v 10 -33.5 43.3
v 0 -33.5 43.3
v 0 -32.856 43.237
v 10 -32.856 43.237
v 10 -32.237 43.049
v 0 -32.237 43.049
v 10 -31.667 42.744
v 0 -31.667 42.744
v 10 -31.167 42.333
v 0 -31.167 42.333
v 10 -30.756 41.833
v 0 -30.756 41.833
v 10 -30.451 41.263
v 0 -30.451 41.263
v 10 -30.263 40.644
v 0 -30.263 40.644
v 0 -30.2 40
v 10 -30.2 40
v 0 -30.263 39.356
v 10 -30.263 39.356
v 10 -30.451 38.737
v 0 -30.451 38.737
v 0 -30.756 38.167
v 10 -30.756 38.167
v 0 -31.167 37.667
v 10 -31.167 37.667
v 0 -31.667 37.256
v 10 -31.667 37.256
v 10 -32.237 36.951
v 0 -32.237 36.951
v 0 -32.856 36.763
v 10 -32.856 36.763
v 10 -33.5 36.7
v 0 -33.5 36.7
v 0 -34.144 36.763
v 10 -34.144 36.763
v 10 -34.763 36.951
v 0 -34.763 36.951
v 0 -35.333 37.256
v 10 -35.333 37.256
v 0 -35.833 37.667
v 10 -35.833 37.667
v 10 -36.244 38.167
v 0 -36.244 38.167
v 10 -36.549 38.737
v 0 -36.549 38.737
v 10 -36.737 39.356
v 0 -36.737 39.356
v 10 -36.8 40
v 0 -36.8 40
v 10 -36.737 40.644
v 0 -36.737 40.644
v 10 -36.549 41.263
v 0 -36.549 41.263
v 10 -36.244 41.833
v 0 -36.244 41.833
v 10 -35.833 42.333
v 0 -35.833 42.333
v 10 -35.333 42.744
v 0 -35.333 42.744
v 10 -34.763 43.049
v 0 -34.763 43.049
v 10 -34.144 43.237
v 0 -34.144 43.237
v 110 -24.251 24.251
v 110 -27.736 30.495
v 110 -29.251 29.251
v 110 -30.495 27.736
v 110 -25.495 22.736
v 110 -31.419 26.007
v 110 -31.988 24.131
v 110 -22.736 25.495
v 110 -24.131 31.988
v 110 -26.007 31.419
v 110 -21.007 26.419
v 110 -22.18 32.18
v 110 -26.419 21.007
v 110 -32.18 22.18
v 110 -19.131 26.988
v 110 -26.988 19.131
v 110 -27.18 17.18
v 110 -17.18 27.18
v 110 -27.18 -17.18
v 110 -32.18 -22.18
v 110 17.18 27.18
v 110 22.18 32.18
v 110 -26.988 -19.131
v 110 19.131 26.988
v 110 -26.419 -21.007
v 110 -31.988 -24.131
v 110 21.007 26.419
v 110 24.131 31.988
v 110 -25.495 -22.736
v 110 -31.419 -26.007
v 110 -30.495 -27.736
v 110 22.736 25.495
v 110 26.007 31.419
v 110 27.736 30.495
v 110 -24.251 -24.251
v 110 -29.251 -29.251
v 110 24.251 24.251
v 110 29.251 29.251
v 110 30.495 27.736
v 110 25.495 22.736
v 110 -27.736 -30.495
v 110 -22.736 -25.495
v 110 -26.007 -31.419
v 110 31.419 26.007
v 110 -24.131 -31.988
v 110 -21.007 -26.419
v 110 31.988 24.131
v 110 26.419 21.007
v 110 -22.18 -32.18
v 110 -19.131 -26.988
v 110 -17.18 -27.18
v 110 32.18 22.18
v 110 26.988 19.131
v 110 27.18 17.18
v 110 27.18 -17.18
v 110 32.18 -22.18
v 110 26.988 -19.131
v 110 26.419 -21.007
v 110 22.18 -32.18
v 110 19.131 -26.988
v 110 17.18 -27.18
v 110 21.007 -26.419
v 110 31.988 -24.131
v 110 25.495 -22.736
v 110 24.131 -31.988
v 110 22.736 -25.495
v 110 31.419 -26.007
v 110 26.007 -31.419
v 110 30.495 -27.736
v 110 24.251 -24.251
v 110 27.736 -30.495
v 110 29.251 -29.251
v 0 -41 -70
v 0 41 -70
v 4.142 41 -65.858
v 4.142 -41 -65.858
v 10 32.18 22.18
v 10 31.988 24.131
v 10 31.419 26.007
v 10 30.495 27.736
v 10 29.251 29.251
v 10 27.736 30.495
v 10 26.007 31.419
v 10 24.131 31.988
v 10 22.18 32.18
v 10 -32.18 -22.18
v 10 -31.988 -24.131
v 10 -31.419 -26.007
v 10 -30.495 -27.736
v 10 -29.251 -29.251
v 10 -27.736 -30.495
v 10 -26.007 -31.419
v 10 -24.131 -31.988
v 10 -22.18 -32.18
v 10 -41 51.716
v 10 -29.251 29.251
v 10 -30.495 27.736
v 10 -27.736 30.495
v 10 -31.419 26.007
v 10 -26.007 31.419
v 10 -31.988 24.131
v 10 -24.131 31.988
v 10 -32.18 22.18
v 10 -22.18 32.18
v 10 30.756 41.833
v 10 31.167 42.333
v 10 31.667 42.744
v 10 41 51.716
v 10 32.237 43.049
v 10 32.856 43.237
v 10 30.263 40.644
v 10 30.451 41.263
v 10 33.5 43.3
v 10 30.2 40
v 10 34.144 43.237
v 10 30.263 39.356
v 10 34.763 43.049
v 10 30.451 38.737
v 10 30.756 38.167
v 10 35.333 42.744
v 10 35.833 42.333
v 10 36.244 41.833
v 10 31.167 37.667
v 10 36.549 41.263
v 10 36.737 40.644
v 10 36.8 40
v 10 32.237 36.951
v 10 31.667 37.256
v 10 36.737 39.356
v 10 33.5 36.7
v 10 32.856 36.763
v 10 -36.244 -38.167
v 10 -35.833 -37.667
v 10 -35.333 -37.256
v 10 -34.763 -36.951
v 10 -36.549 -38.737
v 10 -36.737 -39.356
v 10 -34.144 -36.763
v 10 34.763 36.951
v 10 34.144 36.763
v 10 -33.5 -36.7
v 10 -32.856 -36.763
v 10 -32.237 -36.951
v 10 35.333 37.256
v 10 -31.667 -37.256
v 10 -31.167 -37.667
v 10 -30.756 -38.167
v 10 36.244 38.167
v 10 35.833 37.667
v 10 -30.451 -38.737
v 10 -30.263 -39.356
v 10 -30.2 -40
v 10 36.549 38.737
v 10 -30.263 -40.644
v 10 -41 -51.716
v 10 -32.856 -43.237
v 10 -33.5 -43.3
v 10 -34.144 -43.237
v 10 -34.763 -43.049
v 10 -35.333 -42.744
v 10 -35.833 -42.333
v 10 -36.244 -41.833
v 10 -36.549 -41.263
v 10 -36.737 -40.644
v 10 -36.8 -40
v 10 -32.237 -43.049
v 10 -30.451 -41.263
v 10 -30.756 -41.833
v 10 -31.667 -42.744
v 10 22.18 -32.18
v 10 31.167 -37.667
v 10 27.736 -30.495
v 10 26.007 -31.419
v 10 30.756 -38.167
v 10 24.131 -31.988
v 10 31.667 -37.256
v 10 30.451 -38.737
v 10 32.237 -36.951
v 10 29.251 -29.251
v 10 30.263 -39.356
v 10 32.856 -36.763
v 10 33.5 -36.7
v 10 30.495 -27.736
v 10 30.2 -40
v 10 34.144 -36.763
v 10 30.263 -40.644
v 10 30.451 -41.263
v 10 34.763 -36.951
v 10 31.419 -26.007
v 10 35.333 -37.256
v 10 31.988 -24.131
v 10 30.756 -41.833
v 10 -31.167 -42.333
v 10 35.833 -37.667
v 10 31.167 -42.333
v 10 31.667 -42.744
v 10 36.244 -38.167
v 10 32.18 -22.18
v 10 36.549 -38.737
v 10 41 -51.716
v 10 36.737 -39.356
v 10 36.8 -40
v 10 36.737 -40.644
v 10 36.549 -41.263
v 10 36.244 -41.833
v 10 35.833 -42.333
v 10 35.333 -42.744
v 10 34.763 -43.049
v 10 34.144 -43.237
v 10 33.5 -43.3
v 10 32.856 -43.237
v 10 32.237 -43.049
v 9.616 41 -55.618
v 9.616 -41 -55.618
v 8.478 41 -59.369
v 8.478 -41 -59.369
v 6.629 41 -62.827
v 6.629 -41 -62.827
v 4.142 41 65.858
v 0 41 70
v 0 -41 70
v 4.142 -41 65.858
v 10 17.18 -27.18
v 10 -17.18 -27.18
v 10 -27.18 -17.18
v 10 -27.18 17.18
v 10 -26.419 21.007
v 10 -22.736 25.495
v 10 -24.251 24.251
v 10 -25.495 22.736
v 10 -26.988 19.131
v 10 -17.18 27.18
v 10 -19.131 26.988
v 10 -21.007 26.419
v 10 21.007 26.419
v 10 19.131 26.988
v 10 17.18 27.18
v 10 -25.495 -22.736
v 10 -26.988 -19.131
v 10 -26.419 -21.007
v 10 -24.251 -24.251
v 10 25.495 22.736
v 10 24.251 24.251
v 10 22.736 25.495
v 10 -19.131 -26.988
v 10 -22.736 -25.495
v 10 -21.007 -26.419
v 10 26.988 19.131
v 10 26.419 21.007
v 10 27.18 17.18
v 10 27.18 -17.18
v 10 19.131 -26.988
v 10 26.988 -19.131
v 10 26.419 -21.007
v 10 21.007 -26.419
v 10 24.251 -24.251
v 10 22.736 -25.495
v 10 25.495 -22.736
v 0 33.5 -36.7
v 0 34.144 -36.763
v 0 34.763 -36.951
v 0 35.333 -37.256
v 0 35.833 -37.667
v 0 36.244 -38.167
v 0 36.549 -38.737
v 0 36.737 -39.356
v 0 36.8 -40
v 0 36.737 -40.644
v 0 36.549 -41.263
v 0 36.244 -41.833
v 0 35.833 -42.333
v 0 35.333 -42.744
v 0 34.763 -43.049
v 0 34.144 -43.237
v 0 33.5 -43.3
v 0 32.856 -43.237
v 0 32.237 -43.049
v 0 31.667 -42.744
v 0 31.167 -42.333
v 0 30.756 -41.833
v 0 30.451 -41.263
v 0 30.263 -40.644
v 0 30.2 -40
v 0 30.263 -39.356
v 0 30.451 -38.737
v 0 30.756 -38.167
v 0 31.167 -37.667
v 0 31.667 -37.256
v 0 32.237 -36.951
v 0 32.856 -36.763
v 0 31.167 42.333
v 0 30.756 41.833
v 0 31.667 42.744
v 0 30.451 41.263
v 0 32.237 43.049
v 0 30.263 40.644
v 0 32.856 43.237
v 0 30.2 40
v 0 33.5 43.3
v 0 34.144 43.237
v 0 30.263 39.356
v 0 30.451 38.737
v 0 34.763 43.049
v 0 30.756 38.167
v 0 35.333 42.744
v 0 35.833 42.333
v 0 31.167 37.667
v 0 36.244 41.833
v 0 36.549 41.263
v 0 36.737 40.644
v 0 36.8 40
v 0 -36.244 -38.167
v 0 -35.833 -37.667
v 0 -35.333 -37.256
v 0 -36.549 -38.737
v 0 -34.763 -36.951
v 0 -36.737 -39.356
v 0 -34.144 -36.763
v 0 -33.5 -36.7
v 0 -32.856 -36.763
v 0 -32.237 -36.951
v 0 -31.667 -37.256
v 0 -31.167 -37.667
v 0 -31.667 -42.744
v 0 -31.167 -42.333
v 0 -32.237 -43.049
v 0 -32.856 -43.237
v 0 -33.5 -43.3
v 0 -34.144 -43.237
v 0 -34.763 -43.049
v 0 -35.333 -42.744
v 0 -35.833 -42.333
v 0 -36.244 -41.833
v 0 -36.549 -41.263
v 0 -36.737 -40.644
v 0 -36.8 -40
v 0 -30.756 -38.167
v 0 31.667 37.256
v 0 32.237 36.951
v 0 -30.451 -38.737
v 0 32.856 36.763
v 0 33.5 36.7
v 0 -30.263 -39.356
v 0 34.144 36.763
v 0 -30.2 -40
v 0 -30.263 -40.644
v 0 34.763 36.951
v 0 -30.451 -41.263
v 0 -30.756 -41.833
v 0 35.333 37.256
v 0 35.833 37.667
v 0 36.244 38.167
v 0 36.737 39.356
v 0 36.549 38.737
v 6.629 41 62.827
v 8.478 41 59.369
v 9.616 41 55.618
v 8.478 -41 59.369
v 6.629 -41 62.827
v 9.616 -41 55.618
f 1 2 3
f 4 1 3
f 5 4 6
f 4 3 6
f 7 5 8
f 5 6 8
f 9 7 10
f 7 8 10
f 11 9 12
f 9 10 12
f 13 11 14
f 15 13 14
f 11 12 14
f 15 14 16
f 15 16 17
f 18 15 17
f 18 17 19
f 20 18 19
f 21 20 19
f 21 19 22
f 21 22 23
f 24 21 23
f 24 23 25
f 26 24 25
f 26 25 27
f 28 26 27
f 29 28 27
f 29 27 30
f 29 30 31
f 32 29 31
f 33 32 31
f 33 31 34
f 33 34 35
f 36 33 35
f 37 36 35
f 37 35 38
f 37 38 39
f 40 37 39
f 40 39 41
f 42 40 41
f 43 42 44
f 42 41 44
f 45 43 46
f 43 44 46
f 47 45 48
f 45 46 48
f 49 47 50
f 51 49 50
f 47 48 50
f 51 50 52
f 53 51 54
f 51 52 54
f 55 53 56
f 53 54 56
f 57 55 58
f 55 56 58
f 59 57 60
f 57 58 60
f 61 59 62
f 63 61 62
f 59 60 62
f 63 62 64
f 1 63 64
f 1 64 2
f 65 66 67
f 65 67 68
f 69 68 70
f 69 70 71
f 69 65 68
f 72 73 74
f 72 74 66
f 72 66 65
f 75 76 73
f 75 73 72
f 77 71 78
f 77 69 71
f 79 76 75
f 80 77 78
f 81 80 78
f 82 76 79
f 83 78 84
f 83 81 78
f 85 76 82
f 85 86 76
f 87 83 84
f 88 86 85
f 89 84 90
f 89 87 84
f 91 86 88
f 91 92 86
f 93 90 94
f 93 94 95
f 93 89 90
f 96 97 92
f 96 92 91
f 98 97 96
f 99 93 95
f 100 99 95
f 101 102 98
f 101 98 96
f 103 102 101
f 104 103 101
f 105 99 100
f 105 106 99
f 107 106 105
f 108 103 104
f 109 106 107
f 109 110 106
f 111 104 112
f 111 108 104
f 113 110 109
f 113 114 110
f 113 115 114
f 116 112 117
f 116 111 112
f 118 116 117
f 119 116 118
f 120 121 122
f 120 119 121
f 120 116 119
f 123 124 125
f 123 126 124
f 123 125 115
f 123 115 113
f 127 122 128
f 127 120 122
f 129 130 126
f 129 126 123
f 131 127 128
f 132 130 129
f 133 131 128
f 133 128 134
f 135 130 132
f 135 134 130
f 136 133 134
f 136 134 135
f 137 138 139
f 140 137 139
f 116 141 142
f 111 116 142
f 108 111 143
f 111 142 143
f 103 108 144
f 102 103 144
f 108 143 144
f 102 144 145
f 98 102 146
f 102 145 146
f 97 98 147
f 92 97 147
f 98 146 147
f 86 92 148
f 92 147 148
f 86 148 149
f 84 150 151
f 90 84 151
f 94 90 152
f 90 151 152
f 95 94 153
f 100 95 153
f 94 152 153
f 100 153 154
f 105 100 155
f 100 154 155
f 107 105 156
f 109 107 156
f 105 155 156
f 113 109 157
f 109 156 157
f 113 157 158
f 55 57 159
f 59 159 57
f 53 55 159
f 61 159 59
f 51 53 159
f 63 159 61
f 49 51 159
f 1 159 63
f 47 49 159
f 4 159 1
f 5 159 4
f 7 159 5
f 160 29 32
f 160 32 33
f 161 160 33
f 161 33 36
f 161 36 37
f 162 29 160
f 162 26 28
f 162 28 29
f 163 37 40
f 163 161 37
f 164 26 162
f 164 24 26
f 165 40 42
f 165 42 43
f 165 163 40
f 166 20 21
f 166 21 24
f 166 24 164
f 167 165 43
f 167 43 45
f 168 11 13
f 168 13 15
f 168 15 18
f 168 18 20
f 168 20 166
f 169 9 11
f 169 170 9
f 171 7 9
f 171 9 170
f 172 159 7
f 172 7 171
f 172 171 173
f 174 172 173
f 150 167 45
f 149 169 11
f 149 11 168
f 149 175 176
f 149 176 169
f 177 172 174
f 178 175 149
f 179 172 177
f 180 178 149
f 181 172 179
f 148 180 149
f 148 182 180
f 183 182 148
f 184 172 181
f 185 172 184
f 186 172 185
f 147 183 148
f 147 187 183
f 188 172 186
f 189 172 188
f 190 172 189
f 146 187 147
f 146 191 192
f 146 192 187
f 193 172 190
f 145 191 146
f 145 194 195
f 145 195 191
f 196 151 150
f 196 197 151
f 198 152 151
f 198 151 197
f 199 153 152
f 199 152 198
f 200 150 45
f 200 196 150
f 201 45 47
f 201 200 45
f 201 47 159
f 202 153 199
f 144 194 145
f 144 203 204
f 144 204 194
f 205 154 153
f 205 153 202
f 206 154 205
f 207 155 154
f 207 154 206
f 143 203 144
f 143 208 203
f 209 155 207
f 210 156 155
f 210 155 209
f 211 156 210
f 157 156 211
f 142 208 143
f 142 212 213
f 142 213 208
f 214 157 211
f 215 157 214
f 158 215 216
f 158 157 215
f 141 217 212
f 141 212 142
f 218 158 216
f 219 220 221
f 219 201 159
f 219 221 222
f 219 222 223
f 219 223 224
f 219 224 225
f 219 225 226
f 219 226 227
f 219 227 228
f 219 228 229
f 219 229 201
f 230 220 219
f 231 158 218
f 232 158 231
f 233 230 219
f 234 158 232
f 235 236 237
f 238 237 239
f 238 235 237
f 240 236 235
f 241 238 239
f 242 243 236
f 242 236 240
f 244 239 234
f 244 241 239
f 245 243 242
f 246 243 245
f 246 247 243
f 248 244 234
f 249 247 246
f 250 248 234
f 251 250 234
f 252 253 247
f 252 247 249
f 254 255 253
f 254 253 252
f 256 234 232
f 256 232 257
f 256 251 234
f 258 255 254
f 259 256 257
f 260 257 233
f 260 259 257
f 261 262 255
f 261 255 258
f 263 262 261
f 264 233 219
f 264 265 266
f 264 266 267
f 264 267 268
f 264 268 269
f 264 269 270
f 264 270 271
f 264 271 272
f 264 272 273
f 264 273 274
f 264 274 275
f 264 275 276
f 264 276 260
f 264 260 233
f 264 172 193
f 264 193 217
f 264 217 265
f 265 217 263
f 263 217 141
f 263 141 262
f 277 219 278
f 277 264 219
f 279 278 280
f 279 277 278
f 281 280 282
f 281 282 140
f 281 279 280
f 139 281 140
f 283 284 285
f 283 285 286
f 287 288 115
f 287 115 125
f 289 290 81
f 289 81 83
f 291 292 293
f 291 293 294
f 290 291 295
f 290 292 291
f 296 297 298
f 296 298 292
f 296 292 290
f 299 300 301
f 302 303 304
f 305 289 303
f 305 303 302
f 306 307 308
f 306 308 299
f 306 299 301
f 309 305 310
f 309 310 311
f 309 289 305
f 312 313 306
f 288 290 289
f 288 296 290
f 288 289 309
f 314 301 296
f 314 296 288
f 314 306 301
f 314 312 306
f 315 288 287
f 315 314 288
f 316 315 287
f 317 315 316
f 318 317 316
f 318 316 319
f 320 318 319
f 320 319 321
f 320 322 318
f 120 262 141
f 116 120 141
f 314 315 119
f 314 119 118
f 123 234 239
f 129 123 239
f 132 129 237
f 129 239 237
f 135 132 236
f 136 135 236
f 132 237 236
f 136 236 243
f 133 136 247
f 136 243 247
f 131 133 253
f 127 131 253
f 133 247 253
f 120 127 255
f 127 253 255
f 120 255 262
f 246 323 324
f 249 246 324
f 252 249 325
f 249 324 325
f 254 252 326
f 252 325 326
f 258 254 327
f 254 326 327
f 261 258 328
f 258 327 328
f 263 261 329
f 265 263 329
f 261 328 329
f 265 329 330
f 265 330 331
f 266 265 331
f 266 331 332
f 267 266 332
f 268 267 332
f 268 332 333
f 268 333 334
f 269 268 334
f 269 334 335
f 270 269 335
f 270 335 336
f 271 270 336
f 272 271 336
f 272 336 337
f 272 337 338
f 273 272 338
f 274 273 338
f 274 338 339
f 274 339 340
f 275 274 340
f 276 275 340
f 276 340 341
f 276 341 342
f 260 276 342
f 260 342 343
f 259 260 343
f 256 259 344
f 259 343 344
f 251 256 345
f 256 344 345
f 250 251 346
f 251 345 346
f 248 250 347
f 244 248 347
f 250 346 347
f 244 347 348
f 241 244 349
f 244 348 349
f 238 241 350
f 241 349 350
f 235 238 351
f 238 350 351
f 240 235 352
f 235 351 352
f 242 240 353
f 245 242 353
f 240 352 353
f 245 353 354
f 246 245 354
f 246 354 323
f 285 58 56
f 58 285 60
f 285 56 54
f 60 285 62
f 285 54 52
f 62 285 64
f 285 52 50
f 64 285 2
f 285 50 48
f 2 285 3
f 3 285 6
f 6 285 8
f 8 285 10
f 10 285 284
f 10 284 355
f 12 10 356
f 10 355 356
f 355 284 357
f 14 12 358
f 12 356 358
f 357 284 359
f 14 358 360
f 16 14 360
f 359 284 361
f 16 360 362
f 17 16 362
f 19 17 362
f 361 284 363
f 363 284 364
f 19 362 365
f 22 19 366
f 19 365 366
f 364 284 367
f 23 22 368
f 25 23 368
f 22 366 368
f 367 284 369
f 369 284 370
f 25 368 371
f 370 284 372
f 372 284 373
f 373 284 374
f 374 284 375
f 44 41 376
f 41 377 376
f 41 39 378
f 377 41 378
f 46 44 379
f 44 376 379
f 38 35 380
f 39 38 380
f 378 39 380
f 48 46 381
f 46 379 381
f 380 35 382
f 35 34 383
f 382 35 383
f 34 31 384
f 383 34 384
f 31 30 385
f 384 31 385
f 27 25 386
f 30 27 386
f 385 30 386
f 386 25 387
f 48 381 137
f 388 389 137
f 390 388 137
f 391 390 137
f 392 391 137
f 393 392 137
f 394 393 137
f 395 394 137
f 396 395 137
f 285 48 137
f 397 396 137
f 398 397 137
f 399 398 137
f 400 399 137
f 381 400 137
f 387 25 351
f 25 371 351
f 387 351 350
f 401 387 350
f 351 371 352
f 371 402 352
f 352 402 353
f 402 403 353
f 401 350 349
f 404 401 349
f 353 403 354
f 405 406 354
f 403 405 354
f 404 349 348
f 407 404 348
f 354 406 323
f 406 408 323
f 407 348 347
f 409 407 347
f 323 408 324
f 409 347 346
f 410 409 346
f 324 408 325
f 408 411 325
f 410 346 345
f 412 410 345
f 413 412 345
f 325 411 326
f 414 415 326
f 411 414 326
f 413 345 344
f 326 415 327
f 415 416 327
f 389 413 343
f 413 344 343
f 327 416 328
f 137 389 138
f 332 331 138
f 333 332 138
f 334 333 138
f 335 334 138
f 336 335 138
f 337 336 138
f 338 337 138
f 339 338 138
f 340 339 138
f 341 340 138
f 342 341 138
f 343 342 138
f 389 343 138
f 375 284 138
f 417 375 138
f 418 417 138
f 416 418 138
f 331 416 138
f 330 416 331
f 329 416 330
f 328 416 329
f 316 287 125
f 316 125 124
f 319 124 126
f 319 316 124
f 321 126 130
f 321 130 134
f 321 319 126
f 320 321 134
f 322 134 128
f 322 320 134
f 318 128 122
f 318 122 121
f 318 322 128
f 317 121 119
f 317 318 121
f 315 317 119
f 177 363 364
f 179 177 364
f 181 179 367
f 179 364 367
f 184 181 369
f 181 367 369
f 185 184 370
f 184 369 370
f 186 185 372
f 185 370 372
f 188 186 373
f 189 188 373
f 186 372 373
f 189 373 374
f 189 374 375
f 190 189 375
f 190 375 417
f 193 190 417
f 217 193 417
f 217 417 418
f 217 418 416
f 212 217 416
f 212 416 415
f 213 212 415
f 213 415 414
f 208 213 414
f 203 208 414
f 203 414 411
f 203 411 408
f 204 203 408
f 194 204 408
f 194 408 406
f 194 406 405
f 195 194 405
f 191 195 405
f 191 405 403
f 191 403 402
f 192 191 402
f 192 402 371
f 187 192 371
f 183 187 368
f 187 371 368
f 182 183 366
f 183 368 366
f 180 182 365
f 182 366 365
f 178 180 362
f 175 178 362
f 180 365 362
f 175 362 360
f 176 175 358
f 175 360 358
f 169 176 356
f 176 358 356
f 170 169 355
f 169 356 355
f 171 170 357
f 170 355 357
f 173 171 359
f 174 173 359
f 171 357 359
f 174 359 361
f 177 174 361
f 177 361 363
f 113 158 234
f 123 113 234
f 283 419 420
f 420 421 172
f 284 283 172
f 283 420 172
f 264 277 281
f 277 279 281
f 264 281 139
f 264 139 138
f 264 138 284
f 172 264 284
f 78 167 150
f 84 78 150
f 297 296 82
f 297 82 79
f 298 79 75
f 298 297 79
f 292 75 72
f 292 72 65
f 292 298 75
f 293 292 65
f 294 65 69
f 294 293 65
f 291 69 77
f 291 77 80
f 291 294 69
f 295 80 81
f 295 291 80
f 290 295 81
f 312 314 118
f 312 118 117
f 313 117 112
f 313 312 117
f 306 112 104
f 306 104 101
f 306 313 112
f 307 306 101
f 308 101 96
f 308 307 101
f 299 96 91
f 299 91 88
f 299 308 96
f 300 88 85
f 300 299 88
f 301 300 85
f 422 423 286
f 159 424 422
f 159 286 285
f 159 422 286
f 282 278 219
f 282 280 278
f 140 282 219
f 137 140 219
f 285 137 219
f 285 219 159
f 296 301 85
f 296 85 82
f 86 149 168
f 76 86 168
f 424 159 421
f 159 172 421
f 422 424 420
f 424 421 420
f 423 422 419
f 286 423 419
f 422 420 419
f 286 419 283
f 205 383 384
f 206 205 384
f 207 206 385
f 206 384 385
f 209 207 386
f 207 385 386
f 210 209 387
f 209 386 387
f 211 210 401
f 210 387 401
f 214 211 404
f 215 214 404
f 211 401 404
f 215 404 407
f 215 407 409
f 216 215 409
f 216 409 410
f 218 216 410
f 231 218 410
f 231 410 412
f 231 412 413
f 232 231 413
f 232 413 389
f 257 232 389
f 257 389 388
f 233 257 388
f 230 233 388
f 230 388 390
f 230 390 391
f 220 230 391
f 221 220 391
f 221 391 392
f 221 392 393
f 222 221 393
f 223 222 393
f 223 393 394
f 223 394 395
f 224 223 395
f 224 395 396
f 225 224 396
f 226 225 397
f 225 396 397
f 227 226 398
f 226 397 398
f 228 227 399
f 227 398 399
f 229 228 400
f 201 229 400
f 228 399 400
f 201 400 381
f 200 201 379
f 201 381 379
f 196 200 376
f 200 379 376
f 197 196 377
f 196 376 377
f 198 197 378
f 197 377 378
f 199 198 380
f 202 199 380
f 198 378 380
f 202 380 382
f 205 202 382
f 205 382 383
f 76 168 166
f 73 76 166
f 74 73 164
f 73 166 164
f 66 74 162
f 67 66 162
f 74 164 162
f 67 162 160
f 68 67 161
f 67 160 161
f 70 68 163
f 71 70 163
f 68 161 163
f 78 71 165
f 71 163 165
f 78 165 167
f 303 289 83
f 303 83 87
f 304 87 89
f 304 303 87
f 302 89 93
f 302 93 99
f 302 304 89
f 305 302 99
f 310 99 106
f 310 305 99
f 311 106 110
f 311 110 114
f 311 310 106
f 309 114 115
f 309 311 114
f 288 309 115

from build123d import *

# Parameters (mm, degrees)
SKETCH1_W                = 120
SKETCH1_H                = 82
BOSS_EXTRUDE1_DEPTH      = 10
BOSS_EXTRUDE4_DEPTH      = 82
FILLET2_R                = 20
BOSS_EXTRUDE5_DEPTH      = 100
M6_CLEARANCE_HOLE1_D     = 6.6
M6_CLEARANCE_HOLE1_DEPTH = 10


with BuildPart() as part:
    # Sketch1 → Boss-Extrude1 (new body)
    with BuildSketch(Plane(origin=(0, 0, 0), x_dir=(0, 0, -1), z_dir=(1, 0, 0))):
        Rectangle(SKETCH1_W, SKETCH1_H)
    extrude(amount=BOSS_EXTRUDE1_DEPTH)

    # Sketch6 → Boss-Extrude4 (add)
    with BuildSketch(Plane(origin=(0, 41, 0), x_dir=(1, 0, 0), z_dir=(0, 1, 0))):
        Polygon((0, 60), (0, 70), (10, 60), align=None)
        Polygon((0, -60), (0, -70), (10, -60), align=None)
    extrude(amount=-BOSS_EXTRUDE4_DEPTH)

    # Fillet2
    fillet2_edges = [part.edges().sort_by_distance(p)[0] for p in [
        (10, 0, 60),
        (10, 0, -60),
    ]]
    fillet(fillet2_edges, radius=FILLET2_R)

    # Sketch7 → Boss-Extrude5 (add)
    with BuildSketch(Plane(origin=(10, 0, 0), x_dir=(0, 0, -1), z_dir=(1, 0, 0))):
        with BuildLine():
            Line((-22.18, -32.18), (22.18, -32.18))
            ThreePointArc((22.18, -32.18), (29.251067812, -29.251067812), (32.18, -22.18))
            Line((32.18, -22.18), (32.18, 22.18))
            ThreePointArc((32.18, 22.18), (29.251067812, 29.251067812), (22.18, 32.18))
            Line((22.18, 32.18), (-22.18, 32.18))
            ThreePointArc((-22.18, 32.18), (-29.251067812, 29.251067812), (-32.18, 22.18))
            Line((-32.18, 22.18), (-32.18, -22.18))
            ThreePointArc((-32.18, -22.18), (-29.251067812, -29.251067812), (-22.18, -32.18))
        make_face()
        with BuildLine():
            Line((-17.18, -27.18), (17.18, -27.18))
            ThreePointArc((17.18, -27.18), (24.251067812, -24.251067812), (27.18, -17.18))
            Line((27.18, -17.18), (27.18, 17.18))
            ThreePointArc((27.18, 17.18), (24.251067812, 24.251067812), (17.18, 27.18))
            Line((17.18, 27.18), (-17.18, 27.18))
            ThreePointArc((-17.18, 27.18), (-24.251067812, 24.251067812), (-27.18, 17.18))
            Line((-27.18, 17.18), (-27.18, -17.18))
            ThreePointArc((-27.18, -17.18), (-24.251067812, -24.251067812), (-17.18, -27.18))
        make_face(mode=Mode.SUBTRACT)
    extrude(amount=BOSS_EXTRUDE5_DEPTH)

    # M6 Clearance Hole1
    with Locations(Plane(origin=(10, 0, 0), x_dir=(0, 0, -1), z_dir=(1, 0, 0))):
        with Locations((-40, 33.5), (40, 33.5), (40, -33.5), (-40, -33.5)):
            Hole(M6_CLEARANCE_HOLE1_D / 2, depth=M6_CLEARANCE_HOLE1_DEPTH)


solid = part.part
